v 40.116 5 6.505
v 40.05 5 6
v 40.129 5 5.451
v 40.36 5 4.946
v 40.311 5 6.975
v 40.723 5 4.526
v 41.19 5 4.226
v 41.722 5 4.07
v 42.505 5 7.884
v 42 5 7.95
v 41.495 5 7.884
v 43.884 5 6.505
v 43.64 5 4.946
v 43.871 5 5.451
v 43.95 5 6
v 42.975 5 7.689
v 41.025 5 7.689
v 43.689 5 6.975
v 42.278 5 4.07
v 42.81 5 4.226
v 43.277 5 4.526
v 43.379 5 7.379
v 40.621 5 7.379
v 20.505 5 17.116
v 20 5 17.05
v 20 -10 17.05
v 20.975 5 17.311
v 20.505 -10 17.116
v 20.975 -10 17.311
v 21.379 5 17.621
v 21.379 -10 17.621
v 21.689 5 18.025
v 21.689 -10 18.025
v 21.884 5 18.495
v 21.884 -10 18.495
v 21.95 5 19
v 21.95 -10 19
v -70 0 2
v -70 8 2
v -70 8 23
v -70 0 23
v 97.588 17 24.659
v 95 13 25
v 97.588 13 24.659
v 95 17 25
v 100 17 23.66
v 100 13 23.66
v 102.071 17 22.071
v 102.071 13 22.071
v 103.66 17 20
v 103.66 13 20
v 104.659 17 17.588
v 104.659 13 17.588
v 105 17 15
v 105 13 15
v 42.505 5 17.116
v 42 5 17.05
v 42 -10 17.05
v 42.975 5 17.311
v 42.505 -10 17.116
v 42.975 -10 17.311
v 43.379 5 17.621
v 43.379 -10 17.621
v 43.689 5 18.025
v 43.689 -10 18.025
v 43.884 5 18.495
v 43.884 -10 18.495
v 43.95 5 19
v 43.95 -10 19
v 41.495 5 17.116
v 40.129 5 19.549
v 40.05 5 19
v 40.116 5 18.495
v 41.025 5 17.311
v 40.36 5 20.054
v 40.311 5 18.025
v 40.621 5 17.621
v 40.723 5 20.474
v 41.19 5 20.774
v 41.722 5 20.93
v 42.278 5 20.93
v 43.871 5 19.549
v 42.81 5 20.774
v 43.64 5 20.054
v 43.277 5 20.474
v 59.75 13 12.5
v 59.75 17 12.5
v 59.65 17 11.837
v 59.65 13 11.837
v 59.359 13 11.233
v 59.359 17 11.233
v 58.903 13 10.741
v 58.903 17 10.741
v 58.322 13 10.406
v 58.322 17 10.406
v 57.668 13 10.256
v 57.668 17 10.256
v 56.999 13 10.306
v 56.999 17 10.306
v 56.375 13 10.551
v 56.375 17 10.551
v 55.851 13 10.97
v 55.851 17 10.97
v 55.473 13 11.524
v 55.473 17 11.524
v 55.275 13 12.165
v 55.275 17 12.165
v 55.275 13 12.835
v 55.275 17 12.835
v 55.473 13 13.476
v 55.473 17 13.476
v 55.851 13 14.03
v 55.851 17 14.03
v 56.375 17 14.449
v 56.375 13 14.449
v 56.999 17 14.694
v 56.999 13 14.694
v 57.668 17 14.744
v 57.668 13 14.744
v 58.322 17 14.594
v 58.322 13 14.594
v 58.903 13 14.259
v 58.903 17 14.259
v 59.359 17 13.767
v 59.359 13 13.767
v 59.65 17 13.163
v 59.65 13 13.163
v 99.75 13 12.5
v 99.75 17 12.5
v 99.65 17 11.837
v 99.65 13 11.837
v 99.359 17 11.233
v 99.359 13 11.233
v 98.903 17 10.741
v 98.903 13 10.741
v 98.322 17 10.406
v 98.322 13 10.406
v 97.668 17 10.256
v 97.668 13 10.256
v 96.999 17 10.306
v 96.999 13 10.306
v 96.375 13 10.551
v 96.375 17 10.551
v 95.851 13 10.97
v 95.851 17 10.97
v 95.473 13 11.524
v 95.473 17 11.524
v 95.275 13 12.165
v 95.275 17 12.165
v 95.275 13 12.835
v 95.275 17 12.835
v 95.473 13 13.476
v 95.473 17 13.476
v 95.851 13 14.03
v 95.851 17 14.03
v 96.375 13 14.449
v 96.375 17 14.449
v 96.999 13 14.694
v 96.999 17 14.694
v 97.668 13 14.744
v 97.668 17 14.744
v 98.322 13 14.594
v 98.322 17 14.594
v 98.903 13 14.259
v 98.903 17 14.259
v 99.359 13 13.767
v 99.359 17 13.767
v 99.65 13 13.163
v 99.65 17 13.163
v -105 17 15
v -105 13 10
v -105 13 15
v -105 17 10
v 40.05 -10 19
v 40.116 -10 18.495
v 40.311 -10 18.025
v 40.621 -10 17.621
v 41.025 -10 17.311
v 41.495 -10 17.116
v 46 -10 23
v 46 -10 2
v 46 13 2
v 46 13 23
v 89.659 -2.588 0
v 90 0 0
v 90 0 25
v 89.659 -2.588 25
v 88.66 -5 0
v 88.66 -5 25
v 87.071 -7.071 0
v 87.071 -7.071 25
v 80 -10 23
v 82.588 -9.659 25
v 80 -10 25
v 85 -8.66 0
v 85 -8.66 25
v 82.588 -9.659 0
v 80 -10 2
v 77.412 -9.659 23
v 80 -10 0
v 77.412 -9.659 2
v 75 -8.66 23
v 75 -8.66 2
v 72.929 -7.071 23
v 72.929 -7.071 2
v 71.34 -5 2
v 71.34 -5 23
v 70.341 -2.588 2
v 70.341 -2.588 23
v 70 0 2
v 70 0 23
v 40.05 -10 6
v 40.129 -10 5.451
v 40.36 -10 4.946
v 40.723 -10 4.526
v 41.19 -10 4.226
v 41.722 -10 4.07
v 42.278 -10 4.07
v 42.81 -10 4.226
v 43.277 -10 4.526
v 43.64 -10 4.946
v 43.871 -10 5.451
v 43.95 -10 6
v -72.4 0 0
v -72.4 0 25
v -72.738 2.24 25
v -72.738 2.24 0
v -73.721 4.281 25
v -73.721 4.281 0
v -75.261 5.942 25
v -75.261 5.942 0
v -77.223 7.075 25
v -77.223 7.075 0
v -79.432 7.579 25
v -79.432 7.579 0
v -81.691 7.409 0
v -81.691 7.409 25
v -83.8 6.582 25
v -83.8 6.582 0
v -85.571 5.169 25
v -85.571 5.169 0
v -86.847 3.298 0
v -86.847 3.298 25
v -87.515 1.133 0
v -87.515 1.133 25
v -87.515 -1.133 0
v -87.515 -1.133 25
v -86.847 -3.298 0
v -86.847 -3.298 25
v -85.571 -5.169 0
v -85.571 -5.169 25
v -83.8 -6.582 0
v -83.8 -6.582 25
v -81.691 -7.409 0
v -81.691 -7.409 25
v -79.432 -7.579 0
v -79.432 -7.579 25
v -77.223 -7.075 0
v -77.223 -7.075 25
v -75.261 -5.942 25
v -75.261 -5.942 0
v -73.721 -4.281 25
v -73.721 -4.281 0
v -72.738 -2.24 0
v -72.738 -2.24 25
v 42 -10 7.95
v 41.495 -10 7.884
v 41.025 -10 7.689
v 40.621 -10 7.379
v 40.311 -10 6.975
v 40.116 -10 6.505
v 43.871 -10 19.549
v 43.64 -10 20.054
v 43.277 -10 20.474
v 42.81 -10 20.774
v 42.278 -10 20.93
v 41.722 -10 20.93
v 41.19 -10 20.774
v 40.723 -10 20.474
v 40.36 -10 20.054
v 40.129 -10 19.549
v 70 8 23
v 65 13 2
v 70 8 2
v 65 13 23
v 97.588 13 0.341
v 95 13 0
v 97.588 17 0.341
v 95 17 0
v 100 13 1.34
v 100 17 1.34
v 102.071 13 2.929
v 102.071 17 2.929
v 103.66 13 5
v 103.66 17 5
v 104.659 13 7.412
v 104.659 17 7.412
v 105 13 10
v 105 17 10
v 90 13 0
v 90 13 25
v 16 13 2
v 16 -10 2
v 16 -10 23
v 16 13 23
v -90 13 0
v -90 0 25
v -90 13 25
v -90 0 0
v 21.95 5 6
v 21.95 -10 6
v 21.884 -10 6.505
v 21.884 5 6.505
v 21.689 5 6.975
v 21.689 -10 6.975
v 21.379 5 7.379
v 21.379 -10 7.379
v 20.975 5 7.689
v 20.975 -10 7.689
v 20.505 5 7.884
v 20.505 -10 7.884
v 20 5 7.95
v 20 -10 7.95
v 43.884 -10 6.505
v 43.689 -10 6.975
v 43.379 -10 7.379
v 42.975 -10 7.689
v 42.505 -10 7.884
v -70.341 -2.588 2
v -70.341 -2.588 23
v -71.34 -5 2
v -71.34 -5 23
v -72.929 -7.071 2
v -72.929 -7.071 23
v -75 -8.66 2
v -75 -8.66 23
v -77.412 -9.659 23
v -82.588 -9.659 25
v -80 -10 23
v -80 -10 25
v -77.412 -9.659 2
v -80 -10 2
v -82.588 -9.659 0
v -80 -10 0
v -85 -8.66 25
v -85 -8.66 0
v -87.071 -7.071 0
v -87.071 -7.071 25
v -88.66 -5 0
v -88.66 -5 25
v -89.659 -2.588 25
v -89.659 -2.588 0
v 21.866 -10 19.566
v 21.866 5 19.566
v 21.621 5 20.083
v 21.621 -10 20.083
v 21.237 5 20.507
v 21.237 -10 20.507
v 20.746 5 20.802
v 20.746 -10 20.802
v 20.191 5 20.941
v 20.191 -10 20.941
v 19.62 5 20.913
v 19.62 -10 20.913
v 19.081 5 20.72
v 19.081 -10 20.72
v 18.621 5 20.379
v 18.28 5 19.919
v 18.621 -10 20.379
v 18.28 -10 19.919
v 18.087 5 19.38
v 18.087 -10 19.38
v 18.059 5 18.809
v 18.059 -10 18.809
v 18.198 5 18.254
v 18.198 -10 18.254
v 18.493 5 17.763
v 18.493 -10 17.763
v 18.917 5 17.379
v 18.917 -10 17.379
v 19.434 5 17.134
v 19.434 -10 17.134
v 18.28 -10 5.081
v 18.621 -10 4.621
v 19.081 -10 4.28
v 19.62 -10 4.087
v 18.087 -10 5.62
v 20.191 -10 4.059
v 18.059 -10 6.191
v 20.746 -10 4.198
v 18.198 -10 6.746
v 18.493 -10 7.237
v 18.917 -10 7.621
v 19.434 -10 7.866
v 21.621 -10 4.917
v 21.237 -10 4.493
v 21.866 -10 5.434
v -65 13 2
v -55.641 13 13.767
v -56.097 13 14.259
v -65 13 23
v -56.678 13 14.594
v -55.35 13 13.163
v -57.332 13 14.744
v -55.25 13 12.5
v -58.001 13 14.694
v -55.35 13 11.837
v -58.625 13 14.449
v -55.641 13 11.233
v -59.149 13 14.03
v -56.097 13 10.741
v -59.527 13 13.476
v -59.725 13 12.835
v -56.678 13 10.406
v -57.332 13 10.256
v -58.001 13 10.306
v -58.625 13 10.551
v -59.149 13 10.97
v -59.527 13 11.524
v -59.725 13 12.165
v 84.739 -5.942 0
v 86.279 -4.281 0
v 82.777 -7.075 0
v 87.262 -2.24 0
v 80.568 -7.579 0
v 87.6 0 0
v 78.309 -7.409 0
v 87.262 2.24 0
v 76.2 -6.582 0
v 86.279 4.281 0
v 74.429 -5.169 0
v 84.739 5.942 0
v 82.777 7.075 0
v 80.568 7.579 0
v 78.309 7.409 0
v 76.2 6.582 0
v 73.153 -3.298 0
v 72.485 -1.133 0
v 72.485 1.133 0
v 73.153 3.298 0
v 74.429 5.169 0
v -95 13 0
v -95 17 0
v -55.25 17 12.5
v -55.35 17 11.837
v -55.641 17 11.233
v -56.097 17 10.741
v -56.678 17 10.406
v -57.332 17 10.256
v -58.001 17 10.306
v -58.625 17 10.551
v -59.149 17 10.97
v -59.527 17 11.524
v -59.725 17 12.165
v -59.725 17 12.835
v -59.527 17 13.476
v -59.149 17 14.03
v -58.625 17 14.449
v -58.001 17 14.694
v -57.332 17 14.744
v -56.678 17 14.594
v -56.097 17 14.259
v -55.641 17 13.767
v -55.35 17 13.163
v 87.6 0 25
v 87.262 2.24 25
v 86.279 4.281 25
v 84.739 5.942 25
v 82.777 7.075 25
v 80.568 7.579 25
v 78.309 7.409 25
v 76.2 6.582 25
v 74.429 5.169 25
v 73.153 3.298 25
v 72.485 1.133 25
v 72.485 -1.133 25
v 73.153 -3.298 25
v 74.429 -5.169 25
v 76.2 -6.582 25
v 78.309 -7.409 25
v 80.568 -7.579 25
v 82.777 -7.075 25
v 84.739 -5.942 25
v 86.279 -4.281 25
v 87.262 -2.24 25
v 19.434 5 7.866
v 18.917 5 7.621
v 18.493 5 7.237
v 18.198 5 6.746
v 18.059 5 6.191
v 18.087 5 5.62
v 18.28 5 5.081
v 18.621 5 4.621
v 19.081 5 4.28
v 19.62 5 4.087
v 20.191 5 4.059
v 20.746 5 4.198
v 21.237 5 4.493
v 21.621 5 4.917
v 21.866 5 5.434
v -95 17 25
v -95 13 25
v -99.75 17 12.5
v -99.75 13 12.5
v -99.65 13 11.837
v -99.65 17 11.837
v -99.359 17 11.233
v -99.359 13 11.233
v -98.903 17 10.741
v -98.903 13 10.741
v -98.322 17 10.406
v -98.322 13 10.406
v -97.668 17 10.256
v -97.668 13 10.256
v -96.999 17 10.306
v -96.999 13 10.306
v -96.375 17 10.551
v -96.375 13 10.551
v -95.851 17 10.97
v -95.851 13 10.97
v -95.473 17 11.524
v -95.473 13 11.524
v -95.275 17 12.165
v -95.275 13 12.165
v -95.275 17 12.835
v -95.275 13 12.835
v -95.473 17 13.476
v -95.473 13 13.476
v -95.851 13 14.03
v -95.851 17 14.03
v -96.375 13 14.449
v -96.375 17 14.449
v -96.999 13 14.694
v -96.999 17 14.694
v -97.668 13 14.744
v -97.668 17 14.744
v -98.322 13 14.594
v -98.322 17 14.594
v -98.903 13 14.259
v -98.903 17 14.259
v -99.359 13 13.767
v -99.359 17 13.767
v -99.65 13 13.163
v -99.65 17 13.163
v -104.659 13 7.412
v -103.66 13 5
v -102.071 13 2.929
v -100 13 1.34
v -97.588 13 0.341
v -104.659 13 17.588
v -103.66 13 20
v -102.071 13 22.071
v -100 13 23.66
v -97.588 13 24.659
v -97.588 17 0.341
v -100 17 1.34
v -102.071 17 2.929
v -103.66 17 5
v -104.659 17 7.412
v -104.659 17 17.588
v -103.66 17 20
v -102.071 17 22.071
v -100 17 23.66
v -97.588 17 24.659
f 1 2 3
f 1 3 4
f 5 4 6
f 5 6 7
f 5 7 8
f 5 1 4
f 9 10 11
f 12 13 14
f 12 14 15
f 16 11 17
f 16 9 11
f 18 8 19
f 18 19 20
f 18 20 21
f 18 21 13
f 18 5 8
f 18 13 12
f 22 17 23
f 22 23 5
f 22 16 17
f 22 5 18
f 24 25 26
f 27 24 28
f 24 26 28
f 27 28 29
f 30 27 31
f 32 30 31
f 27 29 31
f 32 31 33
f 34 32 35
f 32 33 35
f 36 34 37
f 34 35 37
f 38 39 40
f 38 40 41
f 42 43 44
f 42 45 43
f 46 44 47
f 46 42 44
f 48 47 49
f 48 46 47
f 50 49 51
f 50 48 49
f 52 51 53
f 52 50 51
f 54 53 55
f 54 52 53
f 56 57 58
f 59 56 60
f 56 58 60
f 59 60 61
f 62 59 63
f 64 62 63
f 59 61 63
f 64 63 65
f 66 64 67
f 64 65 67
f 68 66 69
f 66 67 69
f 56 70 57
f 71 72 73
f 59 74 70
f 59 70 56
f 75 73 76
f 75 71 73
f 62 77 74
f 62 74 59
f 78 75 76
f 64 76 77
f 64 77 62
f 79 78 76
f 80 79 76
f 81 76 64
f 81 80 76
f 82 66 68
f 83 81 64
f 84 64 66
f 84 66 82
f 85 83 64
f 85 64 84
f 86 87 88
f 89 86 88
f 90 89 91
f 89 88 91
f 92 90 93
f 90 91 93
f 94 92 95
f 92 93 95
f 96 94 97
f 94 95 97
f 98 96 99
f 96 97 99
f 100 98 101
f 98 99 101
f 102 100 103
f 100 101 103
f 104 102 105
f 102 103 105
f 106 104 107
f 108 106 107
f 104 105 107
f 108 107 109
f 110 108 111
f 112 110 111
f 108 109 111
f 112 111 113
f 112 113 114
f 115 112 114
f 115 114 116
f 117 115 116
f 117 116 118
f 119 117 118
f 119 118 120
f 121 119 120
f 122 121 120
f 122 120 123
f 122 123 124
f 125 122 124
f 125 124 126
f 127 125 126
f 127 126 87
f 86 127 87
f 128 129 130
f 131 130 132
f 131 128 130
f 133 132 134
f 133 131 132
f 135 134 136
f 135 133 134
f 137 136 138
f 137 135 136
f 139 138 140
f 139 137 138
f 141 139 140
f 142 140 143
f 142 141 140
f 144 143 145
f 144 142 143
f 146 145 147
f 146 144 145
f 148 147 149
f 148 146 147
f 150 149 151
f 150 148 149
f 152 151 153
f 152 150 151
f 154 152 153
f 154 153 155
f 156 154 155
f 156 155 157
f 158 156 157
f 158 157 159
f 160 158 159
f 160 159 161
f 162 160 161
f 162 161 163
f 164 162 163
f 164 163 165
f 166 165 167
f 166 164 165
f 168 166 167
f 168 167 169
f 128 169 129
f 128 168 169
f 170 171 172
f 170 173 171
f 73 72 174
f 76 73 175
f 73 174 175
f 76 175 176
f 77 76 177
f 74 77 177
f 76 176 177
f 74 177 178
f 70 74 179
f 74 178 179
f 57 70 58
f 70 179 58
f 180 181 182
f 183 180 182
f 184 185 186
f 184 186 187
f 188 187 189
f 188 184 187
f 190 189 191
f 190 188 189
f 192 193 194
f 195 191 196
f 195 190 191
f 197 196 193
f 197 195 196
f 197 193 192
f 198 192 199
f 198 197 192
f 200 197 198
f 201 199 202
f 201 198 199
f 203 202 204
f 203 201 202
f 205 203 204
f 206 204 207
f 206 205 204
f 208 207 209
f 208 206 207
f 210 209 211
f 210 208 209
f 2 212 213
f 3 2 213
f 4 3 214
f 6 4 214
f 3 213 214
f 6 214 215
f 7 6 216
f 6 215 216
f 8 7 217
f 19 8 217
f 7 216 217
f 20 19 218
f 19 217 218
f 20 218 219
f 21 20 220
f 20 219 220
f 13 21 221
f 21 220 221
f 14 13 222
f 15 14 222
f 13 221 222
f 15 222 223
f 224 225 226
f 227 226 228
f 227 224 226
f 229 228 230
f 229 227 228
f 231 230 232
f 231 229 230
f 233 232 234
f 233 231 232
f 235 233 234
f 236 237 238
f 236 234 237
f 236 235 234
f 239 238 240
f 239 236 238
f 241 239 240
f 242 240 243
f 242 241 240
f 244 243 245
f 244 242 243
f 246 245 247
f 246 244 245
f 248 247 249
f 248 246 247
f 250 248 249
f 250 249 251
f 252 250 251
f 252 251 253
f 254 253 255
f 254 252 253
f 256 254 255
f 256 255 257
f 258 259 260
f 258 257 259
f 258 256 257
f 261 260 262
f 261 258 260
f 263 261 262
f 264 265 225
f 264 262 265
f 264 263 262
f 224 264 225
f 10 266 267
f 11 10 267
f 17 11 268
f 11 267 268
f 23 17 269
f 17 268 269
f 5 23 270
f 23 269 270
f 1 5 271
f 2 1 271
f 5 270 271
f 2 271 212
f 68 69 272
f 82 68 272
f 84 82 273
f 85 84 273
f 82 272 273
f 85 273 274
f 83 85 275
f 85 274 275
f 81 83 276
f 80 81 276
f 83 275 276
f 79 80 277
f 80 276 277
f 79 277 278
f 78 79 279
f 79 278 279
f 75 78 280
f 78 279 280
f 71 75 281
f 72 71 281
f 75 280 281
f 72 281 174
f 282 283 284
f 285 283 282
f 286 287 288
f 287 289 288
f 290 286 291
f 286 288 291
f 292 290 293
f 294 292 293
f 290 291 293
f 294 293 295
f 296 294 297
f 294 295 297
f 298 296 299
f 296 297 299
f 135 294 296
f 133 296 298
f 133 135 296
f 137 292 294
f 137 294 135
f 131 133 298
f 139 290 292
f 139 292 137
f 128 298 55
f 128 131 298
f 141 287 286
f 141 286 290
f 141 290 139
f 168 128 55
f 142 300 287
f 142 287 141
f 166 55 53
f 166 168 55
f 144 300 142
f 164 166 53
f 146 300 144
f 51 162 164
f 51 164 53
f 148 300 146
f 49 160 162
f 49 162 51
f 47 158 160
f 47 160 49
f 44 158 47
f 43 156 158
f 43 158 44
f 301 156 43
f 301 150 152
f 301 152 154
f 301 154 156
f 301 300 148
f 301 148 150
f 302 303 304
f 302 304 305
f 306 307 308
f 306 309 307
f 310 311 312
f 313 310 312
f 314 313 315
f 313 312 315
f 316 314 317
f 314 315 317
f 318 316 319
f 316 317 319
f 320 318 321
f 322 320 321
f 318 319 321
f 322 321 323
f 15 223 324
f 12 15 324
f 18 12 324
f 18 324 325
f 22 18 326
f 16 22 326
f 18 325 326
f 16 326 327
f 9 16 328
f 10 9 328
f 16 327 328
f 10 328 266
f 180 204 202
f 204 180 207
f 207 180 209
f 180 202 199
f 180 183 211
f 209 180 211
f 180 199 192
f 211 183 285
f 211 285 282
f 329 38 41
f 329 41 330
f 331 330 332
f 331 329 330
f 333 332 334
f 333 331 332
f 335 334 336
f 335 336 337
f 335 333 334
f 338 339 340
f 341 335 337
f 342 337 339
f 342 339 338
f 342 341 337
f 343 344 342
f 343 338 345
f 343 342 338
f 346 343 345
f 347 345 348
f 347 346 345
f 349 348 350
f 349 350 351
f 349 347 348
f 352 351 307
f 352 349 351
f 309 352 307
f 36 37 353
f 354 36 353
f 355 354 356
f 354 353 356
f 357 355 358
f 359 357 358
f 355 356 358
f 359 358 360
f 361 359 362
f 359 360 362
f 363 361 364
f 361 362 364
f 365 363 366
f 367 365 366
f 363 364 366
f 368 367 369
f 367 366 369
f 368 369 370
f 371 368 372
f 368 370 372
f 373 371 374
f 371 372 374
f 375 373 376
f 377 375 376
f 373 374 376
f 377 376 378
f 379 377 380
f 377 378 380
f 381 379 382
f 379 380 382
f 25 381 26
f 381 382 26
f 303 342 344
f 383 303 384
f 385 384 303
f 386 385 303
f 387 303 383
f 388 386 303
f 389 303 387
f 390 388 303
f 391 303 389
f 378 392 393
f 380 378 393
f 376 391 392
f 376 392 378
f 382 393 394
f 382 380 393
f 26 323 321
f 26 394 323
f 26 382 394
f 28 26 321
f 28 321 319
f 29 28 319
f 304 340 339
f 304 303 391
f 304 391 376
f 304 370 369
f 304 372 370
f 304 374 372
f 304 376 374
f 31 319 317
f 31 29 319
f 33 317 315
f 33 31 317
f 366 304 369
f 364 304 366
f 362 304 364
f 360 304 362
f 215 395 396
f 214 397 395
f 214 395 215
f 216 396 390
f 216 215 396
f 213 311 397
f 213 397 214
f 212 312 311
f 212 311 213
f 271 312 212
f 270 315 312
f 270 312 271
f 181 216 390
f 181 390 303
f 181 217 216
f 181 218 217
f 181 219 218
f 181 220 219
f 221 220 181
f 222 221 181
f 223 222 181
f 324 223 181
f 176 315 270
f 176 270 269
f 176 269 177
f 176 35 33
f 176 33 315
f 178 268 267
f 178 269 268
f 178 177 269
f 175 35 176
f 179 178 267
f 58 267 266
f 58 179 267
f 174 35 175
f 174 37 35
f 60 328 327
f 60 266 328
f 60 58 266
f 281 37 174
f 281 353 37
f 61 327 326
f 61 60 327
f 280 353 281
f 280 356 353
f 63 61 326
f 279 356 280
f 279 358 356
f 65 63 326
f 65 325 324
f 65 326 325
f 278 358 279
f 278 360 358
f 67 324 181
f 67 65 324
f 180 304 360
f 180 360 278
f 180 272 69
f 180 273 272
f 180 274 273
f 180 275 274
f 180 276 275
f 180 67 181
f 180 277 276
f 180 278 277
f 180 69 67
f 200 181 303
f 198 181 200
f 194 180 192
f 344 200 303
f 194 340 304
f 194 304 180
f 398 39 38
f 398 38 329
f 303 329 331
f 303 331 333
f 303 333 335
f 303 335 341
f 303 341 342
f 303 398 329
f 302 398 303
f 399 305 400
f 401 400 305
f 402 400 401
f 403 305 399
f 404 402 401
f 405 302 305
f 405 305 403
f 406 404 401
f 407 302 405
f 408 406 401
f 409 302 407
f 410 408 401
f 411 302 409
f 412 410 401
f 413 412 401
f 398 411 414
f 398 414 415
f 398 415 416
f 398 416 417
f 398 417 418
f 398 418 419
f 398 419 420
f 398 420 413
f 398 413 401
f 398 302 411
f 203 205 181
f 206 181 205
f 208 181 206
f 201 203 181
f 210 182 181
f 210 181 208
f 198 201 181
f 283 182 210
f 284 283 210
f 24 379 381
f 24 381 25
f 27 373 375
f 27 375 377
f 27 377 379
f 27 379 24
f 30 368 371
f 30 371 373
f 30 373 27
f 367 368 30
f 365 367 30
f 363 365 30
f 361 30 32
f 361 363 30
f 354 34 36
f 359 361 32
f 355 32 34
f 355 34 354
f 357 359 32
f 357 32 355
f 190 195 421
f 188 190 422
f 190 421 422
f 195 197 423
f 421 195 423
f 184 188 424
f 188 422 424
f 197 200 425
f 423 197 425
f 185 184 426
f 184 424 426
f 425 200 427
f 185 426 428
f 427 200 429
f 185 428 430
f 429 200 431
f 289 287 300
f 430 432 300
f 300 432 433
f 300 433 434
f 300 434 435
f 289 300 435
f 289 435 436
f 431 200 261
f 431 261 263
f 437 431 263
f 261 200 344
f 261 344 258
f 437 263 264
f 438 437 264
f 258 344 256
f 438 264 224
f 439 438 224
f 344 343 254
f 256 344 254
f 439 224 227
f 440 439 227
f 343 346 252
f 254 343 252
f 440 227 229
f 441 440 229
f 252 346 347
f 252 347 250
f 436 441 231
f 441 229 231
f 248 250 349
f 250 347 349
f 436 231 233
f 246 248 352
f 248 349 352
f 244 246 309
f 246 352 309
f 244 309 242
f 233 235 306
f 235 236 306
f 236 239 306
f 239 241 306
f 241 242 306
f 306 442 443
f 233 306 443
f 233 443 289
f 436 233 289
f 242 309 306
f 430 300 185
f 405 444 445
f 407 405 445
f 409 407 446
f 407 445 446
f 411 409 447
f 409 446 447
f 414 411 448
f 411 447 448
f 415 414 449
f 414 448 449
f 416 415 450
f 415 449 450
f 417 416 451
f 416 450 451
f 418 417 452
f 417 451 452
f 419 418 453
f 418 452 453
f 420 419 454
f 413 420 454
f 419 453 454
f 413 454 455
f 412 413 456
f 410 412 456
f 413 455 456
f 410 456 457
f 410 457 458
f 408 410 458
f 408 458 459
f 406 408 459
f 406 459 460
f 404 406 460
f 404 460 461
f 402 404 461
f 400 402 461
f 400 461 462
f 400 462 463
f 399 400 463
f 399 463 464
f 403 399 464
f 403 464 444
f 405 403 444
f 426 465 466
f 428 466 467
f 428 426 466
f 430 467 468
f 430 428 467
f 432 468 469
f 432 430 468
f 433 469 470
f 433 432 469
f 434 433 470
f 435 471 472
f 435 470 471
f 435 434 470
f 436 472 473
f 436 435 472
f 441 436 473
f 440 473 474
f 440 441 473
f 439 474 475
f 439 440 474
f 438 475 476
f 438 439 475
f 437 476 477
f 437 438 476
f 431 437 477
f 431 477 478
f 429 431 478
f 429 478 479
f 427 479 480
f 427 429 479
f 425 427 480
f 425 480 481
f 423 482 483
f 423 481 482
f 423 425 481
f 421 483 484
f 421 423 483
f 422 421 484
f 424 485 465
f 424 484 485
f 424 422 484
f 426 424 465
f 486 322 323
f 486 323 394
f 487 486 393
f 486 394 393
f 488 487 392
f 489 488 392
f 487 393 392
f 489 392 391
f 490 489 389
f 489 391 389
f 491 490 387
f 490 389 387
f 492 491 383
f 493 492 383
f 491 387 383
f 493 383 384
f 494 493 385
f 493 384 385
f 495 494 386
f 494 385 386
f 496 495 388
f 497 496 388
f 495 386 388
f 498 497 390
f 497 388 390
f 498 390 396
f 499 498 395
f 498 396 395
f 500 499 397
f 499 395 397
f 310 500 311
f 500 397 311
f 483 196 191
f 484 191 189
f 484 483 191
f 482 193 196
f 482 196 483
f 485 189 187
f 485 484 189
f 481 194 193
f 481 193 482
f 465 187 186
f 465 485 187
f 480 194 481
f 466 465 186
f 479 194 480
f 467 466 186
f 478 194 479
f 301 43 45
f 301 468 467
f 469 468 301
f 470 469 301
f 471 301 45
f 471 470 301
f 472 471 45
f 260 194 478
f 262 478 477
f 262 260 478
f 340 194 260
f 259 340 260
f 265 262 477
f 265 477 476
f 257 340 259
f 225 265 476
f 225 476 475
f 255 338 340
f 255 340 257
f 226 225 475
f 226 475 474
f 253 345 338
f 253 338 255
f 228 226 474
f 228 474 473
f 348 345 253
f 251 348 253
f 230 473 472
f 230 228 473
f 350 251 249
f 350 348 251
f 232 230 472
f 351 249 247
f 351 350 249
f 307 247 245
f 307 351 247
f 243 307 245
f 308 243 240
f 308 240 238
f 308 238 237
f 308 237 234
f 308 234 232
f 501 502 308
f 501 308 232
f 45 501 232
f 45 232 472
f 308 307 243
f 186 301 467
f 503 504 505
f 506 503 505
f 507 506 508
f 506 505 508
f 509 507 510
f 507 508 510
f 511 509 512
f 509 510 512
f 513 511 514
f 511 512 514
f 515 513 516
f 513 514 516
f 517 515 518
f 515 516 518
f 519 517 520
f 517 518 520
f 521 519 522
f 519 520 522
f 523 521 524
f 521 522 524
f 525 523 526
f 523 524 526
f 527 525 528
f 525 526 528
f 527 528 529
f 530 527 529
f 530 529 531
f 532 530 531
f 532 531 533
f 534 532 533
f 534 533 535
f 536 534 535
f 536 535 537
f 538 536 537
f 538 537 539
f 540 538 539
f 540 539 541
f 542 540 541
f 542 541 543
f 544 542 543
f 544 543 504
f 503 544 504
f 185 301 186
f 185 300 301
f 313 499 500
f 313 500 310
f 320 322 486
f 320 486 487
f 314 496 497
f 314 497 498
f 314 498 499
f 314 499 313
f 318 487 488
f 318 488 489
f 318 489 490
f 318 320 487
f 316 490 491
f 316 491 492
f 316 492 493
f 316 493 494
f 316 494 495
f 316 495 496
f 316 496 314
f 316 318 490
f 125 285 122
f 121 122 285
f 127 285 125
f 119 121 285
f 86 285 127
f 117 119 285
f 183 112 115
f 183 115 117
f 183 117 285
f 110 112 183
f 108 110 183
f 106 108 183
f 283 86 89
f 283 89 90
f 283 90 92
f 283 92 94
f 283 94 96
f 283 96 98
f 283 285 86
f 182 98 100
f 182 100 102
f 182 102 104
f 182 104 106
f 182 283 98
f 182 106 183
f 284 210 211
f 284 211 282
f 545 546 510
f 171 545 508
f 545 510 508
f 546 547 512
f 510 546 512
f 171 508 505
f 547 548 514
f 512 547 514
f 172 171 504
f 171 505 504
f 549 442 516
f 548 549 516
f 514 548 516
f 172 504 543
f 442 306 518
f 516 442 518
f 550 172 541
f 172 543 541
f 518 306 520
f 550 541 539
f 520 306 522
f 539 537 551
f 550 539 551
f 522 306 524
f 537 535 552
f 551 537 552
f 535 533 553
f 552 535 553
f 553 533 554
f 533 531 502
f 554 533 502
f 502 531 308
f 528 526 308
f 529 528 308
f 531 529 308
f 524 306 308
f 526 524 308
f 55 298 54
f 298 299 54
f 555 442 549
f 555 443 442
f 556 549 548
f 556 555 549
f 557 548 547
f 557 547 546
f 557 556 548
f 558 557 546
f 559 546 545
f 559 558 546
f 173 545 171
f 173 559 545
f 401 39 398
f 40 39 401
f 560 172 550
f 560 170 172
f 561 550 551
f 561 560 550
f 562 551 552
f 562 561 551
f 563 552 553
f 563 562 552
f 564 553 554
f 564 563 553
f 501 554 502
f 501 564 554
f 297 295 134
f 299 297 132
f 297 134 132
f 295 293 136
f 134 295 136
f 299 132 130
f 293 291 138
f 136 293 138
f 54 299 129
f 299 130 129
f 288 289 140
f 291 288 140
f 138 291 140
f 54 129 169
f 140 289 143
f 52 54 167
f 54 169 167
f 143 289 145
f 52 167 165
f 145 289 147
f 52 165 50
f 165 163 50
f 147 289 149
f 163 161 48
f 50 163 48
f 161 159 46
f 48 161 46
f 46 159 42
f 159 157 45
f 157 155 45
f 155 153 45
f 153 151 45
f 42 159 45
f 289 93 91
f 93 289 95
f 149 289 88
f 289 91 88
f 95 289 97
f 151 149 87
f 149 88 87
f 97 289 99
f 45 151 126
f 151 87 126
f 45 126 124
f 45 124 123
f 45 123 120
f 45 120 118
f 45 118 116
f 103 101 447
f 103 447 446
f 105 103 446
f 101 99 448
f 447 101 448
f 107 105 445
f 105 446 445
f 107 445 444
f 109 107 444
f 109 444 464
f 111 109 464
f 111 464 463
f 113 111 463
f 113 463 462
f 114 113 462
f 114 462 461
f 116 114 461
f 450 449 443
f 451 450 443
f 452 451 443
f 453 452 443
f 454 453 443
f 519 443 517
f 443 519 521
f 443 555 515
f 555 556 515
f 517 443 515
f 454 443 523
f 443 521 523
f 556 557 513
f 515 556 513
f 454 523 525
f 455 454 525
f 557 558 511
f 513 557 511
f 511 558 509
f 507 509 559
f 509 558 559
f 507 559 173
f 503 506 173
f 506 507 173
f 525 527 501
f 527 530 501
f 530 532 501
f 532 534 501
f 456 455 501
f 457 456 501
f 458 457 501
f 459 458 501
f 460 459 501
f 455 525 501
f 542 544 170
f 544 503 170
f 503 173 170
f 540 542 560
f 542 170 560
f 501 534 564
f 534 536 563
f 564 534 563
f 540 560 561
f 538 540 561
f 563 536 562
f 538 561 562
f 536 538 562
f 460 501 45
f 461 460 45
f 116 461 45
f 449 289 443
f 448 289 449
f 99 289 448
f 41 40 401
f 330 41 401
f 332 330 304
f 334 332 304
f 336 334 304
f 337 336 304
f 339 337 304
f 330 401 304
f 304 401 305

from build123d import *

# Parameters (mm, degrees)
SKETCH1_R            = 7.6
BOSS_EXTRUDE1_DEPTH  = 25
SKETCH2_W            = 30
SKETCH2_H            = 27
BOSS_EXTRUDE2_DEPTH  = 25
SKETCH3_R            = 7.6
BOSS_EXTRUDE3_DEPTH  = 2
CHAMFER1_SIZE        = 5
SKETCH5_W            = 25
SKETCH5_H            = 4
BOSS_EXTRUDE4_DEPTH  = 15
SKETCH6_R            = 2.25
CUT_EXTRUDE2_DEPTH   = 15
FILLET1_R            = 10
FILLET1_OF_MIRROR2_R = 10
SKETCH7_R            = 2.25
CUT_EXTRUDE3_DEPTH   = 15
CUT_EXTRUDE4_DEPTH   = 15


with BuildPart() as part:
    # Sketch1 → Boss-Extrude1 (new body)
    with BuildSketch(Plane.XY):
        with BuildLine():
            Line((-90, 0), (-90, 17))
            Line((-90, 17), (90, 17))
            Line((90, 17), (90, 0))
            ThreePointArc((90, 0), (80, -10), (70, 0))
            Line((70, 0), (70, 13))
            Line((70, 13), (-70, 13))
            Line((-70, 13), (-70, 0))
            ThreePointArc((-70, 0), (-80, -10), (-90, 0))
        make_face()
        with Locations((-80, 0)):
            Circle(SKETCH1_R, mode=Mode.SUBTRACT)
        with Locations((80, 0)):
            Circle(SKETCH1_R, mode=Mode.SUBTRACT)
    extrude(amount=BOSS_EXTRUDE1_DEPTH)

    # Sketch2 → Boss-Extrude2 (add)
    with BuildSketch(Plane(origin=(0, 0, 0), x_dir=(-1, 0, 0), z_dir=(0, 0, -1))):
        with Locations((-31, 3.5)):
            Rectangle(SKETCH2_W, SKETCH2_H)
    extrude(amount=-BOSS_EXTRUDE2_DEPTH)

    # Sketch3 → Boss-Extrude3 (add)
    with BuildSketch(Plane(origin=(0, 0, 0), x_dir=(-1, 0, 0), z_dir=(0, 0, -1))):
        with BuildLine():
            Line((80, -10), (-12, -10))
            Line((-12, -10), (-42, -10))
            Line((-42, -10), (-80, -10))
            ThreePointArc((-80, -10), (-87.071067812, -7.071067812), (-90, 0))
            Line((-90, 0), (-90, 17))
            Line((-90, 17), (90, 17))
            Line((90, 17), (90, 0))
            ThreePointArc((90, 0), (87.071067812, -7.071067812), (80, -10))
        make_face()
        with Locations((80, 0)):
            Circle(SKETCH3_R, mode=Mode.SUBTRACT)
        with Locations((-80, 0)):
            Circle(SKETCH3_R, mode=Mode.SUBTRACT)
    boss_extrude3 = extrude(amount=-BOSS_EXTRUDE3_DEPTH)

    # Mirror1: Boss-Extrude3 across plane
    add(boss_extrude3.mirror(Plane.XY.offset(12.5)))

    # Chamfer1
    chamfer1_edges = [part.edges().sort_by_distance(p)[0] for p in [
        (70, 13, 12.5),
        (-70, 13, 12.5),
    ]]
    chamfer(chamfer1_edges, length=CHAMFER1_SIZE)

    # Sketch5 → Boss-Extrude4 (add)
    with BuildSketch(Plane.ZY.offset(90)):
        with Locations((12.5, 15)):
            Rectangle(SKETCH5_W, SKETCH5_H)
    boss_extrude4 = extrude(amount=BOSS_EXTRUDE4_DEPTH)

    # Sketch6 → Cut-Extrude2 (cut)
    with BuildSketch(Plane(origin=(0, 13, 0), x_dir=(-1, 0, 0), z_dir=(0, -1, 0))):
        with Locations((97.5, -12.5)):
            Circle(SKETCH6_R)
    cut_extrude2 = extrude(amount=-CUT_EXTRUDE2_DEPTH, mode=Mode.SUBTRACT)

    # Fillet1
    fillet1_edges = [part.edges().sort_by_distance(p)[0] for p in [
        (-105, 15, 0),
        (-105, 15, 25),
    ]]
    fillet(fillet1_edges, radius=FILLET1_R)

    # Mirror2: Boss-Extrude4 across plane
    add(boss_extrude4.mirror(Plane(origin=(0, 0, 0), x_dir=(0, 0, 1), z_dir=(1, 0, 0))))

    # Fillet1 of Mirror2
    fillet1_of_mirror2_edges = [part.edges().sort_by_distance(p)[0] for p in [
        (105, 15, 0),
        (105, 15, 25),
    ]]
    fillet(fillet1_of_mirror2_edges, radius=FILLET1_OF_MIRROR2_R)

    # Mirror4: Cut-Extrude2 across plane
    add(cut_extrude2.mirror(Plane(origin=(0, 0, 0), x_dir=(0, 0, 1), z_dir=(1, 0, 0))), mode=Mode.SUBTRACT)

    # Sketch7 → Cut-Extrude3 (cut)
    with BuildSketch(Plane(origin=(0, 17, 0), x_dir=(1, 0, 0), z_dir=(0, 1, 0))):
        with Locations((-57.5, -12.5)):
            Circle(SKETCH7_R)
        with Locations((57.5, -12.5)):
            Circle(SKETCH7_R)
    extrude(amount=-CUT_EXTRUDE3_DEPTH, mode=Mode.SUBTRACT)

    # Sketch8 → Cut-Extrude4 (cut)
    with BuildSketch(Plane.XZ.offset(10)):
        with BuildLine():
            Line((21.95, 19), (20, 19))
            Line((20, 19), (20, 17.05))
            ThreePointArc((20, 17.05), (21.378858223, 17.621141777), (21.95, 19))
        make_face()
        with BuildLine():
            Line((20, 17.05), (20, 19))
            Line((20, 19), (21.95, 19))
            ThreePointArc((21.95, 19), (18.621141777, 20.378858223), (20, 17.05))
        make_face()
        with BuildLine():
            ThreePointArc((43.95, 19), (42, 20.95), (40.05, 19))
            Line((40.05, 19), (42, 19))
            Line((42, 19), (42, 17.05))
            ThreePointArc((42, 17.05), (43.378858223, 17.621141777), (43.95, 19))
        make_face()
        with BuildLine():
            Line((42, 19), (40.05, 19))
            ThreePointArc((40.05, 19), (40.621141777, 17.621141777), (42, 17.05))
            Line((42, 17.05), (42, 19))
        make_face()
        with BuildLine():
            ThreePointArc((42, 7.95), (40.621141777, 7.378858223), (40.05, 6))
            Line((40.05, 6), (42, 6))
            Line((42, 6), (42, 7.95))
        make_face()
        with BuildLine():
            Line((42, 6), (40.05, 6))
            ThreePointArc((40.05, 6), (42, 4.05), (43.95, 6))
            ThreePointArc((43.95, 6), (43.378858223, 7.378858223), (42, 7.95))
            Line((42, 7.95), (42, 6))
        make_face()
        with BuildLine():
            ThreePointArc((21.95, 6), (21.378858223, 7.378858223), (20, 7.95))
            Line((20, 7.95), (20, 6))
            Line((20, 6), (21.95, 6))
        make_face()
        with BuildLine():
            Line((20, 6), (20, 7.95))
            ThreePointArc((20, 7.95), (18.621141777, 4.621141777), (21.95, 6))
            Line((21.95, 6), (20, 6))
        make_face()
    extrude(amount=-CUT_EXTRUDE4_DEPTH, mode=Mode.SUBTRACT)


solid = part.part
